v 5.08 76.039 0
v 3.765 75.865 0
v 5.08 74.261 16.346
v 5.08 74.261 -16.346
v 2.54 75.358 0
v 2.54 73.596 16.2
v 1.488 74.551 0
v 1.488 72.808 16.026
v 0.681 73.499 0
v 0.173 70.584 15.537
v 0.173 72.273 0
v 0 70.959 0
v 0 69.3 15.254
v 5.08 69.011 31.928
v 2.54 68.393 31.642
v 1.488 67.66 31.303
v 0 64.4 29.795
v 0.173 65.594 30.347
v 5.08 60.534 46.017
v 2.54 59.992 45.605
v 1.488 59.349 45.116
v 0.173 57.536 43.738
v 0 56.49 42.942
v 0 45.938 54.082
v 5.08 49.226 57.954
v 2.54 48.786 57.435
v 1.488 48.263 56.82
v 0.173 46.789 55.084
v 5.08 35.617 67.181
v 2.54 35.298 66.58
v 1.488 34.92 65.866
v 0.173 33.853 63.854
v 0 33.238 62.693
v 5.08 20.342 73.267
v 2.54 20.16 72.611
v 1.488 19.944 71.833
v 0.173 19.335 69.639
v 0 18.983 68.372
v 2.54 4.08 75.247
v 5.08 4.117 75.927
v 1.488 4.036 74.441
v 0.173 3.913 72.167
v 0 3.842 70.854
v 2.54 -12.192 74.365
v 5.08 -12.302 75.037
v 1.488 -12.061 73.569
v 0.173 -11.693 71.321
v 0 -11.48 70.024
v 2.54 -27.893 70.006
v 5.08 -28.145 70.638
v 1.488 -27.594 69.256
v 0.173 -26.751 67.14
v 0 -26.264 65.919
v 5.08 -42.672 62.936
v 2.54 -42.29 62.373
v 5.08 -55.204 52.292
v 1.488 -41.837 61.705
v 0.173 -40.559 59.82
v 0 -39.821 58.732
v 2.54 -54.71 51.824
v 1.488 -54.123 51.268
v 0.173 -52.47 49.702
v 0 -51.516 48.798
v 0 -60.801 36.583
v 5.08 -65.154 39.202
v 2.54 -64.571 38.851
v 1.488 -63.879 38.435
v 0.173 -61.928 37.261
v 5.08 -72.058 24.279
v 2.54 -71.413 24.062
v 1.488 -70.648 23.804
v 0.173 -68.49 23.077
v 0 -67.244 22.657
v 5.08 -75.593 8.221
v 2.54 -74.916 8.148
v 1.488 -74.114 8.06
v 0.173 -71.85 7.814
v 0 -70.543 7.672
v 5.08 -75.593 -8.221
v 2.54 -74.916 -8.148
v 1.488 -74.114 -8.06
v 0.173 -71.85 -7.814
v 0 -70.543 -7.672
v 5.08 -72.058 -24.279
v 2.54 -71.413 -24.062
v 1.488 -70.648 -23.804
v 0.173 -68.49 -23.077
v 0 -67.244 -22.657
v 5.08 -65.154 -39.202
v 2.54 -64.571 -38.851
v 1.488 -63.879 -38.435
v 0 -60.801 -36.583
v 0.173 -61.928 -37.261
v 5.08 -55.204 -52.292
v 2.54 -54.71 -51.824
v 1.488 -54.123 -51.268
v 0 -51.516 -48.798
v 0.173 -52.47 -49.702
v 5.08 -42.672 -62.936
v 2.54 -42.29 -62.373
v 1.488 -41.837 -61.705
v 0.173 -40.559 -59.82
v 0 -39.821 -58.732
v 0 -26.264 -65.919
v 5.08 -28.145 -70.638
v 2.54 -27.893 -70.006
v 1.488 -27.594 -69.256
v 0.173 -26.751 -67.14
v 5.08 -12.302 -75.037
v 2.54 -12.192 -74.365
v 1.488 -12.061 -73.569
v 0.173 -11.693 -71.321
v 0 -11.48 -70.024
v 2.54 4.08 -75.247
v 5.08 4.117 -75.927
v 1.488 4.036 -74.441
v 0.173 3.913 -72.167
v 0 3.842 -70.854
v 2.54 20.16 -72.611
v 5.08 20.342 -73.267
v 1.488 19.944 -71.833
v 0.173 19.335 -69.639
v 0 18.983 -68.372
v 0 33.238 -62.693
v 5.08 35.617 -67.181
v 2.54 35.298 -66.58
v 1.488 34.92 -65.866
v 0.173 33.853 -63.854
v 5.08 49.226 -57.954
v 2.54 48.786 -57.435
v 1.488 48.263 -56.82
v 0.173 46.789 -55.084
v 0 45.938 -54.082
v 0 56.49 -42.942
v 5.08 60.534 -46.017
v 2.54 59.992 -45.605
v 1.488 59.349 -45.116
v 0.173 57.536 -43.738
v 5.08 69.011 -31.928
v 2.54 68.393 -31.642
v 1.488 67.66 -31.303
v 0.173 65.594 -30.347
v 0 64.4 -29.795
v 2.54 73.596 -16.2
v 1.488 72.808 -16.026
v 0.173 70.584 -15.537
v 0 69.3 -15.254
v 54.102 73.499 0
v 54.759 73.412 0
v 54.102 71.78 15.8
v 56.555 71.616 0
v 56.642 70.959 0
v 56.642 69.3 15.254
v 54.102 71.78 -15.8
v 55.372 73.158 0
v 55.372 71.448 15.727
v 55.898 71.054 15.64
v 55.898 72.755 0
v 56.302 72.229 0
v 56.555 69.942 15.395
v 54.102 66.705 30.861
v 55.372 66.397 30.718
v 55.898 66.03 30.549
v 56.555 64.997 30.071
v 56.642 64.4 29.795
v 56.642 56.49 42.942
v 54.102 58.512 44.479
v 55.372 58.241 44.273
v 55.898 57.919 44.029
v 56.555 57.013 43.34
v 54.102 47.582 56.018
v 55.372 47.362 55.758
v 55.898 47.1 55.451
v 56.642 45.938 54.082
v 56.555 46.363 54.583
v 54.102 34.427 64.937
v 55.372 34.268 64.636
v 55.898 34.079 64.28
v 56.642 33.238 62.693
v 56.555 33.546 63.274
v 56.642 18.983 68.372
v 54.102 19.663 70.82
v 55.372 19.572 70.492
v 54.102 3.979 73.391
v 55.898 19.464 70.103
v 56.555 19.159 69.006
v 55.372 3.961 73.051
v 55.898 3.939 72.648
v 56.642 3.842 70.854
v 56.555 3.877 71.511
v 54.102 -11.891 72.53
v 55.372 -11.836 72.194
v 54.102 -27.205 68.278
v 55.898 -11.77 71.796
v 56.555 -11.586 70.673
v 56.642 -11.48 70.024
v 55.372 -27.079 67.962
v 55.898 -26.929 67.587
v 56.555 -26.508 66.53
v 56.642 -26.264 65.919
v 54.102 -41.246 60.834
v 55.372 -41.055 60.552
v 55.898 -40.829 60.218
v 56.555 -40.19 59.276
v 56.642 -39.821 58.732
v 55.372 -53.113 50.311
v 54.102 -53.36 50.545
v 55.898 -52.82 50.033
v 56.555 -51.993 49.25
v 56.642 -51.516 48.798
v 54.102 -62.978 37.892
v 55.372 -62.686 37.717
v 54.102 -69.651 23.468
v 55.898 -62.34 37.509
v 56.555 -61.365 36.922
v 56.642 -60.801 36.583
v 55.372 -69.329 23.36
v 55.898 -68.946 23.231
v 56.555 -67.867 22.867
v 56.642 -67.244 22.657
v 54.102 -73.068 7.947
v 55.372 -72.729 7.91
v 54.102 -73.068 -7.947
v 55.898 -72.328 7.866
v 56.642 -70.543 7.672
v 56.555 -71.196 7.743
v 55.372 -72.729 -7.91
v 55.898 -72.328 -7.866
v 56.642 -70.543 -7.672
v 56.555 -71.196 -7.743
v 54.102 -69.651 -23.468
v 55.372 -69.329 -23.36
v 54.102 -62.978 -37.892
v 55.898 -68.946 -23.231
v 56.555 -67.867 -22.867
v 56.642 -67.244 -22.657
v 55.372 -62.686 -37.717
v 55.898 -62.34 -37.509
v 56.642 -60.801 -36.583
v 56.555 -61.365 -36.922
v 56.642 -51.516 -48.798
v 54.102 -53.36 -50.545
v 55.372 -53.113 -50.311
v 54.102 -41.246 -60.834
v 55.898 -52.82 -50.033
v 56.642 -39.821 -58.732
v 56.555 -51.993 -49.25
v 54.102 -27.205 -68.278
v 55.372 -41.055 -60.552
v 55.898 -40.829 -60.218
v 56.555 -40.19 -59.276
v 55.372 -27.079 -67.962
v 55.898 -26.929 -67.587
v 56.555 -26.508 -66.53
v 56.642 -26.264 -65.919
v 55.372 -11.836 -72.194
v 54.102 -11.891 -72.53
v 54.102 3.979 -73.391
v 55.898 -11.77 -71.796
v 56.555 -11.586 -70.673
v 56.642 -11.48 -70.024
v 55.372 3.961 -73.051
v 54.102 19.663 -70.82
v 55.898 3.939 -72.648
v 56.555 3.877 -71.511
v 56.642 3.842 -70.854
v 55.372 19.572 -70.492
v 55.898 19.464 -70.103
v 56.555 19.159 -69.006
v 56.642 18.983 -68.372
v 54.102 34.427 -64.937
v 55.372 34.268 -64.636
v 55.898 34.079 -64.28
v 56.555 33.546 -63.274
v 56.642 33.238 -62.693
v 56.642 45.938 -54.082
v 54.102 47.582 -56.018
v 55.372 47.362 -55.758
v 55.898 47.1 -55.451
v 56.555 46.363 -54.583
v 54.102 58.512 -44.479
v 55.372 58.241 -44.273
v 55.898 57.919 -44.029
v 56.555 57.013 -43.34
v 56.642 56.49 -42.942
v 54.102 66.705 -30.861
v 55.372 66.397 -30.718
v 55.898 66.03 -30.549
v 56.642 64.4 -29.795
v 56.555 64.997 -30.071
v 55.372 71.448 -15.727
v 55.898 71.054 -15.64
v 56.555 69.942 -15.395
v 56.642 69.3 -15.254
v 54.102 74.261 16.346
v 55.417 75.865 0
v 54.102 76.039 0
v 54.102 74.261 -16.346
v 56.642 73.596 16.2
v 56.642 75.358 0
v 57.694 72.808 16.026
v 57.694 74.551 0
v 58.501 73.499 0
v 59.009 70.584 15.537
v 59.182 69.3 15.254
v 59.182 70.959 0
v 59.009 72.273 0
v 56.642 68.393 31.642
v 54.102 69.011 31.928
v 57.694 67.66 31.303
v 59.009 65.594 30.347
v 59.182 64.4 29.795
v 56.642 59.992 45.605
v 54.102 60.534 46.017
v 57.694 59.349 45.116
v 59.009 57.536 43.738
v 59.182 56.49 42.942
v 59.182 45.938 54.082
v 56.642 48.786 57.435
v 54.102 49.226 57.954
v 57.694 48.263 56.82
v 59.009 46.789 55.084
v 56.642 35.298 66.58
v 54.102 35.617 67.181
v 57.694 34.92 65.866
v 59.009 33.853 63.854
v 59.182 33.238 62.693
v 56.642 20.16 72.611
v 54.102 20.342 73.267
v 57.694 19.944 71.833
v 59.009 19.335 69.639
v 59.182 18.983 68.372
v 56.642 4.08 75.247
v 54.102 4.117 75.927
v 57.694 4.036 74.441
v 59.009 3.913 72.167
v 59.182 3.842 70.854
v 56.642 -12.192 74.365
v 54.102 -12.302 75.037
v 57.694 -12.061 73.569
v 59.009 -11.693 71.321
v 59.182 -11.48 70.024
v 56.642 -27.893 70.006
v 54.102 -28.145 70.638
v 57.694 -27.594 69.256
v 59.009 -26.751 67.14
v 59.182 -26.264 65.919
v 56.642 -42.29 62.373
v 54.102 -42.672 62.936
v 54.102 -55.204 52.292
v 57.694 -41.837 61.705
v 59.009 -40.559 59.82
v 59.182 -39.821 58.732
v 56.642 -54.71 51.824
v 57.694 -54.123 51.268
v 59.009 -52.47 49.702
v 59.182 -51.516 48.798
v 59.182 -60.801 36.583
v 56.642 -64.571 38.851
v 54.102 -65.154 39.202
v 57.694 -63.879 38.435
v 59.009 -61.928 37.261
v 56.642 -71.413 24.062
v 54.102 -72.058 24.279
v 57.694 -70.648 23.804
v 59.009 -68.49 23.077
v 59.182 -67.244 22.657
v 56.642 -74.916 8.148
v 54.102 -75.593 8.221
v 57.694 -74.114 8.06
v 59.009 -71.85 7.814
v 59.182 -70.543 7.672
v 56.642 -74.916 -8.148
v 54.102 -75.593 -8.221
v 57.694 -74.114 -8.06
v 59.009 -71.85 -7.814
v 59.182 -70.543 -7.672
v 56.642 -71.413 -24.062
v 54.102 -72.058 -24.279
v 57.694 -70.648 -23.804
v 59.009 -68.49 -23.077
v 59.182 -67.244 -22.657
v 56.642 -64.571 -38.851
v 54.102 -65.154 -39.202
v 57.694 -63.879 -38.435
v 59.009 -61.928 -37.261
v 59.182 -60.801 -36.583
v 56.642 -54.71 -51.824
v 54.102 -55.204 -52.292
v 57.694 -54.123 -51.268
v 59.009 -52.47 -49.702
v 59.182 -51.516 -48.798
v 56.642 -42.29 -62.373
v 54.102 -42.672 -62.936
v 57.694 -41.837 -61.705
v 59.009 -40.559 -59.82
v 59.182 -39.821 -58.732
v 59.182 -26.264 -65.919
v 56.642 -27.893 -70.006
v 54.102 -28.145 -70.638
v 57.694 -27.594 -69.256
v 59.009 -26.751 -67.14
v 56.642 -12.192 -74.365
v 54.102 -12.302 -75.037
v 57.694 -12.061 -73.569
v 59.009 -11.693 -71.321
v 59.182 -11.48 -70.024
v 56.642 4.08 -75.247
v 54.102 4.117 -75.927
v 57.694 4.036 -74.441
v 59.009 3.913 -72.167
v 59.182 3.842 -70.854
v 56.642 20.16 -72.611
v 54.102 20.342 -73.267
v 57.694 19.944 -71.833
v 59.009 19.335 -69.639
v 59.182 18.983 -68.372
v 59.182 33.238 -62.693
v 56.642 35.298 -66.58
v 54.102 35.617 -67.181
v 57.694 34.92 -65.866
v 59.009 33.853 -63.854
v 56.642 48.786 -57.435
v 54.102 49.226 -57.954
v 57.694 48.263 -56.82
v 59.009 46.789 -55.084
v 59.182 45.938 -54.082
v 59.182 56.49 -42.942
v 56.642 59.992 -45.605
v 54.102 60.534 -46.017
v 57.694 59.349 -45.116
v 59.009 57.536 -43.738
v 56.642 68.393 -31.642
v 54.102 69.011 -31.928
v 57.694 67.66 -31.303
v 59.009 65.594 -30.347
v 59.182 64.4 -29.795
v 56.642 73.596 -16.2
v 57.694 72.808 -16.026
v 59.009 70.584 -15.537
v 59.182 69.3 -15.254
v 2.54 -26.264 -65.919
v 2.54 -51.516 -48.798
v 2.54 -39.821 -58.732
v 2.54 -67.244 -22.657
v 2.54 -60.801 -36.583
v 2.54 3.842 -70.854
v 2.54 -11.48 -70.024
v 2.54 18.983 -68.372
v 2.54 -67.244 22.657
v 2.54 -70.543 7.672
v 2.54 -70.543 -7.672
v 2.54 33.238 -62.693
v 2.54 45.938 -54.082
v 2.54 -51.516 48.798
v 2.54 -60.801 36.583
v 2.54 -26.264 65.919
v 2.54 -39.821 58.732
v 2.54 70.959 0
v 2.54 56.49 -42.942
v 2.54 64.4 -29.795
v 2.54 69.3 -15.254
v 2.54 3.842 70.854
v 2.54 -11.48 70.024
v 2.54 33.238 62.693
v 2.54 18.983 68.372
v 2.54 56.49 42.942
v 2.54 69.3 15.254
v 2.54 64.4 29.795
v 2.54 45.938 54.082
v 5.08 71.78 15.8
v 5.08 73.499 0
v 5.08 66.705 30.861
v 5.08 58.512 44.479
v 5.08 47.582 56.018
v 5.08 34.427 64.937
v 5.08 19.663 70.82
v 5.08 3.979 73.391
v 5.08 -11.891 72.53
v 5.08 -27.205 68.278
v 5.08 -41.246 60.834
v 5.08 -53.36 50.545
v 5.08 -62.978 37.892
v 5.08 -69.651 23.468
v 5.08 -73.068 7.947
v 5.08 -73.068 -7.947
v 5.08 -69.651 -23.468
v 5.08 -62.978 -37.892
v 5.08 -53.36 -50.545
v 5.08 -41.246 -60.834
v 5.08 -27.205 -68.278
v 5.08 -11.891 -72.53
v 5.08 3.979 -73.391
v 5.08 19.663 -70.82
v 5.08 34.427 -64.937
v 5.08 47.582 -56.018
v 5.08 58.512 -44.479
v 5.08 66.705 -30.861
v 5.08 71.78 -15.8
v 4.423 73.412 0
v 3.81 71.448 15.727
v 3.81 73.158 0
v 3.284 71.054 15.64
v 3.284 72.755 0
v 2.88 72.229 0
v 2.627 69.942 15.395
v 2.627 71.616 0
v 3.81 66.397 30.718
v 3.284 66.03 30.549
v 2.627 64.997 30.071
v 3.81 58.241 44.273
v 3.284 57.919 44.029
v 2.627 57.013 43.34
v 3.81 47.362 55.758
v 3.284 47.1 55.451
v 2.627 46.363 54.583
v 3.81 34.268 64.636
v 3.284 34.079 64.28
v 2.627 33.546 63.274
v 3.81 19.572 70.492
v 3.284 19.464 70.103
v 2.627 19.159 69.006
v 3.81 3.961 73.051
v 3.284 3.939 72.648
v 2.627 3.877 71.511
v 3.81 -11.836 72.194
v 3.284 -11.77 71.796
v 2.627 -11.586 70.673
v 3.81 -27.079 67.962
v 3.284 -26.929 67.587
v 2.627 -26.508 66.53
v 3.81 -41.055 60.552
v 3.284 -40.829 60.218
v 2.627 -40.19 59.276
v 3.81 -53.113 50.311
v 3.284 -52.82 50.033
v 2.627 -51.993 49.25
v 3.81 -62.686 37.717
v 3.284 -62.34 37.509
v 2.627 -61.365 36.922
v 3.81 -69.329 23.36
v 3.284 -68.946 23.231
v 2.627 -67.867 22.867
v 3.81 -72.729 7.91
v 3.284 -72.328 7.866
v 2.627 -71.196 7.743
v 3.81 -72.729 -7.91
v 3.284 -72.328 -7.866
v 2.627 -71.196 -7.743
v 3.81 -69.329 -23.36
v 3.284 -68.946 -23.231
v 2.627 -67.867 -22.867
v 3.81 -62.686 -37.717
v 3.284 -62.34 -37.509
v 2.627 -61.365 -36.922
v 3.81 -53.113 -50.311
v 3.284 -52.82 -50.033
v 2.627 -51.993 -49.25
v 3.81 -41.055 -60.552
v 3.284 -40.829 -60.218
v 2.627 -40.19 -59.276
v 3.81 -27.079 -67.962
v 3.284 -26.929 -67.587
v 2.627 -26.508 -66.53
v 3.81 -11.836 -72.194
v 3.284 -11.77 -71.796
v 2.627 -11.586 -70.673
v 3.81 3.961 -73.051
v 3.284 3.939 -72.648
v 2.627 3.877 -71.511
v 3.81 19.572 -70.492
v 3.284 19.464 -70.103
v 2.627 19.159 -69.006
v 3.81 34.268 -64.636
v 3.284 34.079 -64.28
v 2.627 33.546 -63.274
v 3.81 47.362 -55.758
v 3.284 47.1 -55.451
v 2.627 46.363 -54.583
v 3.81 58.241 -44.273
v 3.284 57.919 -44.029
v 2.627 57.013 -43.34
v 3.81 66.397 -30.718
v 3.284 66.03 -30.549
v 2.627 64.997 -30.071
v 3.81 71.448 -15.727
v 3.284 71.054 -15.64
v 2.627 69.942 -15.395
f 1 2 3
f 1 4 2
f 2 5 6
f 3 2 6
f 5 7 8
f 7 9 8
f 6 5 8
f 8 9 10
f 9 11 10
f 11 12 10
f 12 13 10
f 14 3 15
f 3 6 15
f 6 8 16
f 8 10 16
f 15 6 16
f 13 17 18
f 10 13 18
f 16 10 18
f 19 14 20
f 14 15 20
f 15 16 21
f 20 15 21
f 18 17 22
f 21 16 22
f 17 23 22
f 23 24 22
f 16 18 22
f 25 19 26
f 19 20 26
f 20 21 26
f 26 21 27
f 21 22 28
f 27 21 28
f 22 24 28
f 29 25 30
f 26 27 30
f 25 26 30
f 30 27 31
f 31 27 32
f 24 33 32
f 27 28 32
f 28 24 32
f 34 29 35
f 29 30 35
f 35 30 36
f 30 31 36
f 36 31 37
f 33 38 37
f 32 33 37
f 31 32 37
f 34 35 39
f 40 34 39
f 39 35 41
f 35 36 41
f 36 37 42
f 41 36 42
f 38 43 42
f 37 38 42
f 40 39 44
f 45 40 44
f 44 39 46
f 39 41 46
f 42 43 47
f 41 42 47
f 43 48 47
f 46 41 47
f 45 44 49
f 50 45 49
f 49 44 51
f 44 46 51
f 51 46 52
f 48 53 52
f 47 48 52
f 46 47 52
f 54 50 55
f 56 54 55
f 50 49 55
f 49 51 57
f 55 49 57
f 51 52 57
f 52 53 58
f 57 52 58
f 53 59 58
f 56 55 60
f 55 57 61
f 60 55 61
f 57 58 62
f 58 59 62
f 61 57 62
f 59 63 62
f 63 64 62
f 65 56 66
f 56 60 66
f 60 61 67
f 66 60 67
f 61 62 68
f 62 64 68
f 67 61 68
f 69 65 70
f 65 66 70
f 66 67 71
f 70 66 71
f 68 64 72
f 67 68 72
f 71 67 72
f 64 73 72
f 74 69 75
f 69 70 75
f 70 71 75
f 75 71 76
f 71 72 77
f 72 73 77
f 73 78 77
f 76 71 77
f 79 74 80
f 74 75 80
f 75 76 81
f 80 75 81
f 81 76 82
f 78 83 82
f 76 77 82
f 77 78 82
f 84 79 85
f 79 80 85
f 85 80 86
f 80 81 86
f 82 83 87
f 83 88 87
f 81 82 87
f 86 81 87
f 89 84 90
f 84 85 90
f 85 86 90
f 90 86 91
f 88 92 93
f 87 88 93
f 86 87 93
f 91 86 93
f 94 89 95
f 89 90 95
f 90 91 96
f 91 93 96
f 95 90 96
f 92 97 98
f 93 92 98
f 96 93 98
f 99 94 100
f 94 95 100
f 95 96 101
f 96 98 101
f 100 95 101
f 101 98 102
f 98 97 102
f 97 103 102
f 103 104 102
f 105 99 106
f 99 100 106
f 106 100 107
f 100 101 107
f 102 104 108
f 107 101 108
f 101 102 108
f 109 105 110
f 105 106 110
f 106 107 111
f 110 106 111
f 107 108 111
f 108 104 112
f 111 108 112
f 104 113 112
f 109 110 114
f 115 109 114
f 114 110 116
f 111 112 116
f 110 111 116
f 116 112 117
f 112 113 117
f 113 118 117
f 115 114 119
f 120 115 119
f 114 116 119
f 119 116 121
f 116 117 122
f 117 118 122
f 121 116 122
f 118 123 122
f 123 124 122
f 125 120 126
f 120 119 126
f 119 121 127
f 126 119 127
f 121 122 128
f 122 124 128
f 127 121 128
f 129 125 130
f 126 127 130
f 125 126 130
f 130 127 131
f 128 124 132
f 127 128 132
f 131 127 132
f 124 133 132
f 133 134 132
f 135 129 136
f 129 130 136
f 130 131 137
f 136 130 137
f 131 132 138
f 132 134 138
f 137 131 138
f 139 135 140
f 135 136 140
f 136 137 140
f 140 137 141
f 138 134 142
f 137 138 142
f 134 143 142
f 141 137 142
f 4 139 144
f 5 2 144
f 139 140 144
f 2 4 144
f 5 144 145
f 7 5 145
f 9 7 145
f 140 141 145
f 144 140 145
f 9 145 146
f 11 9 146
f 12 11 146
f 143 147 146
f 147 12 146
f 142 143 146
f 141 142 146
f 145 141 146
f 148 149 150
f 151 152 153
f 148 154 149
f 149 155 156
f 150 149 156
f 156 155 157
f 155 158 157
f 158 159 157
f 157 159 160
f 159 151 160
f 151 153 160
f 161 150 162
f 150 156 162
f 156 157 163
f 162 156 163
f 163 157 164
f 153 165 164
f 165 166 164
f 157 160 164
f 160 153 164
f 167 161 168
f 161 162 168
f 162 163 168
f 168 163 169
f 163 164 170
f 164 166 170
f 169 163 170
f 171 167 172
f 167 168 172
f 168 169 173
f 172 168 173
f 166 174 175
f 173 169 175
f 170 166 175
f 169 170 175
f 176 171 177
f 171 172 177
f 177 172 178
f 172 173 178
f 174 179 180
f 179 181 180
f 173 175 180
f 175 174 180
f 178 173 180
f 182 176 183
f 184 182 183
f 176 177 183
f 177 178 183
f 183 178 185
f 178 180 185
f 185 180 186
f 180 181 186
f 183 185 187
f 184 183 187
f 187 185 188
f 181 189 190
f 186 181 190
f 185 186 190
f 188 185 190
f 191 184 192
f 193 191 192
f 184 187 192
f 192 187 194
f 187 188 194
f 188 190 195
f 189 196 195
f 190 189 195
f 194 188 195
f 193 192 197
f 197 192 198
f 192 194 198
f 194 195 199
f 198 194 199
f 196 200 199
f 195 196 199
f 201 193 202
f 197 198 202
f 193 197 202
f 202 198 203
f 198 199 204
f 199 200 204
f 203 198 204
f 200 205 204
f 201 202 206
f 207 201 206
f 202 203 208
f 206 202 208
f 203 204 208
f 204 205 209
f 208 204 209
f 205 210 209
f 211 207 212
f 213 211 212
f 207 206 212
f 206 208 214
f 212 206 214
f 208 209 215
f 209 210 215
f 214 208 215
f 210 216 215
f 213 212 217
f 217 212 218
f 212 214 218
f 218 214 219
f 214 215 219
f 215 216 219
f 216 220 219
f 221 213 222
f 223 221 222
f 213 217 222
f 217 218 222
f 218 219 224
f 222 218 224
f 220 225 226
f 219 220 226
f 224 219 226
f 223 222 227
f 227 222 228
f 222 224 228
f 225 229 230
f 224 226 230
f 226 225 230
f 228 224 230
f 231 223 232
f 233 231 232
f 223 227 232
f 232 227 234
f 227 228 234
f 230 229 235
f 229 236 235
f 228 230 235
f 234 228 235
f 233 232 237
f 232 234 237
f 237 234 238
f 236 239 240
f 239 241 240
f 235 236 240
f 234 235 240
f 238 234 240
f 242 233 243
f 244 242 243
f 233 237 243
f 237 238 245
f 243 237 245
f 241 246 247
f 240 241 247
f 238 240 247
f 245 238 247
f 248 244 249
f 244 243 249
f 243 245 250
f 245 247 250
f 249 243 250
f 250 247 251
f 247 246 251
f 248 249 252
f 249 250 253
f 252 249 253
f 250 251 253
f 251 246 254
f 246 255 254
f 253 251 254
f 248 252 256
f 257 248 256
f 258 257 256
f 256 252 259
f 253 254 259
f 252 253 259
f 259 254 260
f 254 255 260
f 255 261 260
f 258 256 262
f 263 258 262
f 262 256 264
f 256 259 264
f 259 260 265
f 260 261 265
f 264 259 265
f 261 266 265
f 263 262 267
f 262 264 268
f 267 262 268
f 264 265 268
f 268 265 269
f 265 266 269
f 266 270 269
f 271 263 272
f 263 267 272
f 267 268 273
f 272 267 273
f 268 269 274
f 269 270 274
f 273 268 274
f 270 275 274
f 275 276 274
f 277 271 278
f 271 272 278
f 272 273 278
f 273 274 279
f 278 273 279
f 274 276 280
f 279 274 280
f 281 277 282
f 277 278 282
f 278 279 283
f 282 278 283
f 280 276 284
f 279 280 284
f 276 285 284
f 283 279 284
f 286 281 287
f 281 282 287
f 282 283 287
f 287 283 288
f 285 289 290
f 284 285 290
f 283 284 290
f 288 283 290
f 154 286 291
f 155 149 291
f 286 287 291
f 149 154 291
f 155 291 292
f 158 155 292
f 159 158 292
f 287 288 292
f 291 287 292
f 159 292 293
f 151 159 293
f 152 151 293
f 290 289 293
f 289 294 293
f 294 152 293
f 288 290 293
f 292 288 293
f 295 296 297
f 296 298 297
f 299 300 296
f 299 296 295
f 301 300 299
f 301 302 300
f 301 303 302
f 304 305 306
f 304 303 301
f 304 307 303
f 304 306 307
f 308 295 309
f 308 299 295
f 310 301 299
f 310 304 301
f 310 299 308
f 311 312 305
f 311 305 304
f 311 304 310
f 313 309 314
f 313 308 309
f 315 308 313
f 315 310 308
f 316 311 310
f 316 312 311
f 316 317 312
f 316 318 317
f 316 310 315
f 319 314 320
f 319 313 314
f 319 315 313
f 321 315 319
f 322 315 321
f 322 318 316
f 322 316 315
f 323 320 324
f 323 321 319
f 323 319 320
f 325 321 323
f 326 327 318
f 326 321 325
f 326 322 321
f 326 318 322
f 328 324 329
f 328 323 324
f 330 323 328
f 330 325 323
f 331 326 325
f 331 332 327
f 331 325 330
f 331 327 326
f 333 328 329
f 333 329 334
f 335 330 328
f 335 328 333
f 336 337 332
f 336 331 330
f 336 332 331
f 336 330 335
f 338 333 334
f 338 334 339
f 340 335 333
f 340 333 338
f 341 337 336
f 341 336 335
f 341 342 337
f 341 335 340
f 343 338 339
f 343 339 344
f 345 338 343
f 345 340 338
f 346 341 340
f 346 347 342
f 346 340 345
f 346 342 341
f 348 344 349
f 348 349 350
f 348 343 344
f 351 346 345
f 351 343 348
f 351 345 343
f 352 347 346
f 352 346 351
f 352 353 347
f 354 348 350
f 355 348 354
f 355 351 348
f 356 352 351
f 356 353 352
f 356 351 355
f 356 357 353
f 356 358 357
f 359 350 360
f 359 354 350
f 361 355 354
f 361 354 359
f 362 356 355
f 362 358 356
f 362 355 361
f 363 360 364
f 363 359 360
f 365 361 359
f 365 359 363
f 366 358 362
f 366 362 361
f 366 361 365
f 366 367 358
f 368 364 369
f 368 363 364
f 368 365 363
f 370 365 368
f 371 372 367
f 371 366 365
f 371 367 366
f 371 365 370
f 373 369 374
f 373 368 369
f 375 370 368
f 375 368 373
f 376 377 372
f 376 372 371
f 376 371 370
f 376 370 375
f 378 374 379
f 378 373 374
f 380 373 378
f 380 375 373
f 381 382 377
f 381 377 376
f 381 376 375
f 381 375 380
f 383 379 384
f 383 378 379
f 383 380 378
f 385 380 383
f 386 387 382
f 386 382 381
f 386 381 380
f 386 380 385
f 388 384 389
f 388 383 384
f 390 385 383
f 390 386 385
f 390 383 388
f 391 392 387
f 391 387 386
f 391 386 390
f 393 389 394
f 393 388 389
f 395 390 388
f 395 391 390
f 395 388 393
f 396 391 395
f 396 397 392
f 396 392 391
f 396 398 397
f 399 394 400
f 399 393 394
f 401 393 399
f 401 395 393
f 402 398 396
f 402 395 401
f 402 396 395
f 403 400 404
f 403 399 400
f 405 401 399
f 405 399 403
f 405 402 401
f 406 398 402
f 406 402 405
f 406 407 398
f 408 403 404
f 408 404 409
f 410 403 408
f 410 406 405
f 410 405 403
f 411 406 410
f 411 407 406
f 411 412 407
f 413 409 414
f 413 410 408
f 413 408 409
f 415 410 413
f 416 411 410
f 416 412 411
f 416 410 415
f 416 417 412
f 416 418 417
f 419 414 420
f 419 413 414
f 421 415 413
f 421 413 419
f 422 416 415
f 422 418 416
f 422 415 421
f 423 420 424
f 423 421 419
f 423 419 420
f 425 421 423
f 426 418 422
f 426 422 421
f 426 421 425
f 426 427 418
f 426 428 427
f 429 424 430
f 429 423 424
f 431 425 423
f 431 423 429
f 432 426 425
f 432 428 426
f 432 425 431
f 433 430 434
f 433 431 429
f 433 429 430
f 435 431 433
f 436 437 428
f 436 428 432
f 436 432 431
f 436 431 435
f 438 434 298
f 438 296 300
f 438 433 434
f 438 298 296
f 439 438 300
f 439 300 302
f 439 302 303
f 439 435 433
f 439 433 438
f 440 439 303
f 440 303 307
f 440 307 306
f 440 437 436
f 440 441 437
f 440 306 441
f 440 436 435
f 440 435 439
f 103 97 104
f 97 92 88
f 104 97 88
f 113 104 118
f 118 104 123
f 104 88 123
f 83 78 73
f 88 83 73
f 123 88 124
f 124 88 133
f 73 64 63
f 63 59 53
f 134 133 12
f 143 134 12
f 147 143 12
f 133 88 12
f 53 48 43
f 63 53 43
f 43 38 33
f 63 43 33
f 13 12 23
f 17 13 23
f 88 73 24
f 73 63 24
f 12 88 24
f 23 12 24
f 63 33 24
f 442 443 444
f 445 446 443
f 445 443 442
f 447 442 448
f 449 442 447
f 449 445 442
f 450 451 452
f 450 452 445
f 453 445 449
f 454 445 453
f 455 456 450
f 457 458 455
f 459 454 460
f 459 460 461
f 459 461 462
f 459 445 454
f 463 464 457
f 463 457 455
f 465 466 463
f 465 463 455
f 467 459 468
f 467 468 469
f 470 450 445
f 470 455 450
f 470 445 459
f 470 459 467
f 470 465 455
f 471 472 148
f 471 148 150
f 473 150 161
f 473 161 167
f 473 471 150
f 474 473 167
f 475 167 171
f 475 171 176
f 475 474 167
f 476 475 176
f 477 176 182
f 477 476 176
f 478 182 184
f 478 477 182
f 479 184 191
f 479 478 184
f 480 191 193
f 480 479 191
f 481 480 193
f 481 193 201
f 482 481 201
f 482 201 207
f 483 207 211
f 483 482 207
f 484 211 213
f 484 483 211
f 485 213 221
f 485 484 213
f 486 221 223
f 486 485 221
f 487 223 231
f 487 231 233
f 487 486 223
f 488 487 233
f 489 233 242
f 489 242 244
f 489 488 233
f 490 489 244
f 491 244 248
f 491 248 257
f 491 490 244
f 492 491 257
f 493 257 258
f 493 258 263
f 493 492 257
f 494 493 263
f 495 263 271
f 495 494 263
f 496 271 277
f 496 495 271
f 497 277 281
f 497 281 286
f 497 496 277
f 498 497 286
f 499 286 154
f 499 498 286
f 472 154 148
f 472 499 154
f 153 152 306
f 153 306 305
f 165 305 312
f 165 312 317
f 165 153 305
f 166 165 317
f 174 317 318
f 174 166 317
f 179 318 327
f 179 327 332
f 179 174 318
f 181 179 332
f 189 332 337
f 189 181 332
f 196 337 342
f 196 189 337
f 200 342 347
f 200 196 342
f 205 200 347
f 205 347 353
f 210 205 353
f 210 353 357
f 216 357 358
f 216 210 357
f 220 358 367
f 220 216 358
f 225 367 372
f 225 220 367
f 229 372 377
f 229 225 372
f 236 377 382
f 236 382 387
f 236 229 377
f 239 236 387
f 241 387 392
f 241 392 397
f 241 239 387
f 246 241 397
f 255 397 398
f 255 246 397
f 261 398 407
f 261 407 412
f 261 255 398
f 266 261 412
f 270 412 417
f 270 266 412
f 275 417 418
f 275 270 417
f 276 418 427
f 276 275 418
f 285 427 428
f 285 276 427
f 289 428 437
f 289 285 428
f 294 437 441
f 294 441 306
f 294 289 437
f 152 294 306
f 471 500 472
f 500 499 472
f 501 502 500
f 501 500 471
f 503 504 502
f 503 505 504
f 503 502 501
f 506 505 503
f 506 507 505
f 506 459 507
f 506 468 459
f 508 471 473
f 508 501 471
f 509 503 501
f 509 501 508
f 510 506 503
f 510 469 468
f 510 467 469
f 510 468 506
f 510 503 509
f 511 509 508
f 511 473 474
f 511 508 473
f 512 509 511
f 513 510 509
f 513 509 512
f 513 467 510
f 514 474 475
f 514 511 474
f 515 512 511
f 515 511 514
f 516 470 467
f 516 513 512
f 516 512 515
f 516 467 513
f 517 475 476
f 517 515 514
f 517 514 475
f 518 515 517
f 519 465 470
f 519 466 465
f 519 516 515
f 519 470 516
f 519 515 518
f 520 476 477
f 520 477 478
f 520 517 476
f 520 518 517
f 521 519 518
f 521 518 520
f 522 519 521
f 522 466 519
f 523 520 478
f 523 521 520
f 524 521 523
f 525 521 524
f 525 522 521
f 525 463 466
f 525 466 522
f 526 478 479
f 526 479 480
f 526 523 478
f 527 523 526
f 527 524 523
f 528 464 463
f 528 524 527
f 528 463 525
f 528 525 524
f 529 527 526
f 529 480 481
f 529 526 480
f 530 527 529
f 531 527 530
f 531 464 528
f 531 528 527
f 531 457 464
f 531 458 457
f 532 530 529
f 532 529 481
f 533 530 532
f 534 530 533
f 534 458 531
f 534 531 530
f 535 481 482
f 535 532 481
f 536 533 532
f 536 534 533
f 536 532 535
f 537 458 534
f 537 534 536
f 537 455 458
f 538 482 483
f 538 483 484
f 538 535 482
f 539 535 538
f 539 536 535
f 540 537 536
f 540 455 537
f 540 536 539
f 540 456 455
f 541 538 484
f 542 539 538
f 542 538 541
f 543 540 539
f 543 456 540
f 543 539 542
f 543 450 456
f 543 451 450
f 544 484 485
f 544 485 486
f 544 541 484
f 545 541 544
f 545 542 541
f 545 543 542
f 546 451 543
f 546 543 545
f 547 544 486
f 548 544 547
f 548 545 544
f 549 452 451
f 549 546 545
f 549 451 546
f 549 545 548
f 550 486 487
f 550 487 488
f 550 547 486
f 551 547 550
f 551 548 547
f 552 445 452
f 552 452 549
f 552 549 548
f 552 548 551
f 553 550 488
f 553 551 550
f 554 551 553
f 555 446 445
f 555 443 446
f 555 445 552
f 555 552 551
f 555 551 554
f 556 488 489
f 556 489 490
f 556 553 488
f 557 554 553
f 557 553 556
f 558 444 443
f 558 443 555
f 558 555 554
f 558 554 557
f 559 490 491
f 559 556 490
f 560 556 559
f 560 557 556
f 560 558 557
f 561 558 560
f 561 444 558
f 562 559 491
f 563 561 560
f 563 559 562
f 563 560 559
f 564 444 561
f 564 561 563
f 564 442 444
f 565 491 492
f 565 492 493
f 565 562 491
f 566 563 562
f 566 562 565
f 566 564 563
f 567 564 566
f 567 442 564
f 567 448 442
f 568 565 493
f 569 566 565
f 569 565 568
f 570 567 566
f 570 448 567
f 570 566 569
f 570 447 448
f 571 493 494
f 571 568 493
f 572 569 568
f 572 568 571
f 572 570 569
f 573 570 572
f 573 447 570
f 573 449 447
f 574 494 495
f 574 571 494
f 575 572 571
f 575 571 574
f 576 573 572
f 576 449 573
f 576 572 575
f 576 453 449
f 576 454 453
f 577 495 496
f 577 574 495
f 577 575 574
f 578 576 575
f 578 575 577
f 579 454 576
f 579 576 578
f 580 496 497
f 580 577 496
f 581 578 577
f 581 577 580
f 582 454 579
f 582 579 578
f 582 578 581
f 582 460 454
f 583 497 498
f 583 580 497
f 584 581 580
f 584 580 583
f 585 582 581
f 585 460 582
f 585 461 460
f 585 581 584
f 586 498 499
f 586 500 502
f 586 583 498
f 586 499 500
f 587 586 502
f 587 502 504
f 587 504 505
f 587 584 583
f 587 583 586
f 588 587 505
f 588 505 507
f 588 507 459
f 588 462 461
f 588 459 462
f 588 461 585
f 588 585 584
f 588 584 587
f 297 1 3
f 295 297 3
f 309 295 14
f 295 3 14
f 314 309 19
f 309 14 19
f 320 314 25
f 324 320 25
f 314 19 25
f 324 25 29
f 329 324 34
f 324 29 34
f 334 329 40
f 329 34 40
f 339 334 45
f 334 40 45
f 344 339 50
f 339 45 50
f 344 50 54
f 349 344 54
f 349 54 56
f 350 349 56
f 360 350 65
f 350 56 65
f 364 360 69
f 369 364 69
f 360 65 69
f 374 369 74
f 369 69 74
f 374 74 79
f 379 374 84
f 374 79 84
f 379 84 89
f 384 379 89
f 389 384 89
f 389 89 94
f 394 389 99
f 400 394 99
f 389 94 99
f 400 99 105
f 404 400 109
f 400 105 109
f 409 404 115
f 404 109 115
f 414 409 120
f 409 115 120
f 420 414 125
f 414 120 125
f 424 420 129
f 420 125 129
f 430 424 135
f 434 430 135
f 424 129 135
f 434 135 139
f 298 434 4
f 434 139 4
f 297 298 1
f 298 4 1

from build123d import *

# Parameters (mm, degrees)
F0_R     = 76.0385345631
F1_DEPTH = 59.182
F2_R     = 5.08
F3_R     = 5.08
F4_T     = -2.54


# Not quite as in the source:
# - a shell that OpenCascade refuses in one call is made with other operations: the cavity is built on its own and cut out


with BuildPart() as f1:
    # F0 (on Right) → F1 (new body)
    with BuildSketch(Plane.YZ):
        Circle(F0_R)
    extrude(amount=F1_DEPTH)

    # F2
    f2_edges = [f1.edges().sort_by_distance(p)[0] for p in [
        (59.182, -76.038535, 0),
    ]]
    fillet(f2_edges, radius=F2_R)

    # F3
    f3_edges = [f1.edges().sort_by_distance(p)[0] for p in [
        (0, -76.038535, 0),
    ]]
    fillet(f3_edges, radius=F3_R)

    # F4: a shell. OpenCascade refuses it in one call, so the cavity is built on its own and cut out:
    # the body offset inwards by the wall thickness, plus a prism from it out through each open face.
    f4_core = offset(f1.part, amount=F4_T, mode=Mode.PRIVATE)
    f4_exits = [f4_core.faces().sort_by_distance(p)[0] for p in [
        (56.642, 0, 0),
    ]]
    add(f4_core, mode=Mode.SUBTRACT)
    extrude(f4_exits, amount=-F4_T, mode=Mode.SUBTRACT)


solid = f1.part
